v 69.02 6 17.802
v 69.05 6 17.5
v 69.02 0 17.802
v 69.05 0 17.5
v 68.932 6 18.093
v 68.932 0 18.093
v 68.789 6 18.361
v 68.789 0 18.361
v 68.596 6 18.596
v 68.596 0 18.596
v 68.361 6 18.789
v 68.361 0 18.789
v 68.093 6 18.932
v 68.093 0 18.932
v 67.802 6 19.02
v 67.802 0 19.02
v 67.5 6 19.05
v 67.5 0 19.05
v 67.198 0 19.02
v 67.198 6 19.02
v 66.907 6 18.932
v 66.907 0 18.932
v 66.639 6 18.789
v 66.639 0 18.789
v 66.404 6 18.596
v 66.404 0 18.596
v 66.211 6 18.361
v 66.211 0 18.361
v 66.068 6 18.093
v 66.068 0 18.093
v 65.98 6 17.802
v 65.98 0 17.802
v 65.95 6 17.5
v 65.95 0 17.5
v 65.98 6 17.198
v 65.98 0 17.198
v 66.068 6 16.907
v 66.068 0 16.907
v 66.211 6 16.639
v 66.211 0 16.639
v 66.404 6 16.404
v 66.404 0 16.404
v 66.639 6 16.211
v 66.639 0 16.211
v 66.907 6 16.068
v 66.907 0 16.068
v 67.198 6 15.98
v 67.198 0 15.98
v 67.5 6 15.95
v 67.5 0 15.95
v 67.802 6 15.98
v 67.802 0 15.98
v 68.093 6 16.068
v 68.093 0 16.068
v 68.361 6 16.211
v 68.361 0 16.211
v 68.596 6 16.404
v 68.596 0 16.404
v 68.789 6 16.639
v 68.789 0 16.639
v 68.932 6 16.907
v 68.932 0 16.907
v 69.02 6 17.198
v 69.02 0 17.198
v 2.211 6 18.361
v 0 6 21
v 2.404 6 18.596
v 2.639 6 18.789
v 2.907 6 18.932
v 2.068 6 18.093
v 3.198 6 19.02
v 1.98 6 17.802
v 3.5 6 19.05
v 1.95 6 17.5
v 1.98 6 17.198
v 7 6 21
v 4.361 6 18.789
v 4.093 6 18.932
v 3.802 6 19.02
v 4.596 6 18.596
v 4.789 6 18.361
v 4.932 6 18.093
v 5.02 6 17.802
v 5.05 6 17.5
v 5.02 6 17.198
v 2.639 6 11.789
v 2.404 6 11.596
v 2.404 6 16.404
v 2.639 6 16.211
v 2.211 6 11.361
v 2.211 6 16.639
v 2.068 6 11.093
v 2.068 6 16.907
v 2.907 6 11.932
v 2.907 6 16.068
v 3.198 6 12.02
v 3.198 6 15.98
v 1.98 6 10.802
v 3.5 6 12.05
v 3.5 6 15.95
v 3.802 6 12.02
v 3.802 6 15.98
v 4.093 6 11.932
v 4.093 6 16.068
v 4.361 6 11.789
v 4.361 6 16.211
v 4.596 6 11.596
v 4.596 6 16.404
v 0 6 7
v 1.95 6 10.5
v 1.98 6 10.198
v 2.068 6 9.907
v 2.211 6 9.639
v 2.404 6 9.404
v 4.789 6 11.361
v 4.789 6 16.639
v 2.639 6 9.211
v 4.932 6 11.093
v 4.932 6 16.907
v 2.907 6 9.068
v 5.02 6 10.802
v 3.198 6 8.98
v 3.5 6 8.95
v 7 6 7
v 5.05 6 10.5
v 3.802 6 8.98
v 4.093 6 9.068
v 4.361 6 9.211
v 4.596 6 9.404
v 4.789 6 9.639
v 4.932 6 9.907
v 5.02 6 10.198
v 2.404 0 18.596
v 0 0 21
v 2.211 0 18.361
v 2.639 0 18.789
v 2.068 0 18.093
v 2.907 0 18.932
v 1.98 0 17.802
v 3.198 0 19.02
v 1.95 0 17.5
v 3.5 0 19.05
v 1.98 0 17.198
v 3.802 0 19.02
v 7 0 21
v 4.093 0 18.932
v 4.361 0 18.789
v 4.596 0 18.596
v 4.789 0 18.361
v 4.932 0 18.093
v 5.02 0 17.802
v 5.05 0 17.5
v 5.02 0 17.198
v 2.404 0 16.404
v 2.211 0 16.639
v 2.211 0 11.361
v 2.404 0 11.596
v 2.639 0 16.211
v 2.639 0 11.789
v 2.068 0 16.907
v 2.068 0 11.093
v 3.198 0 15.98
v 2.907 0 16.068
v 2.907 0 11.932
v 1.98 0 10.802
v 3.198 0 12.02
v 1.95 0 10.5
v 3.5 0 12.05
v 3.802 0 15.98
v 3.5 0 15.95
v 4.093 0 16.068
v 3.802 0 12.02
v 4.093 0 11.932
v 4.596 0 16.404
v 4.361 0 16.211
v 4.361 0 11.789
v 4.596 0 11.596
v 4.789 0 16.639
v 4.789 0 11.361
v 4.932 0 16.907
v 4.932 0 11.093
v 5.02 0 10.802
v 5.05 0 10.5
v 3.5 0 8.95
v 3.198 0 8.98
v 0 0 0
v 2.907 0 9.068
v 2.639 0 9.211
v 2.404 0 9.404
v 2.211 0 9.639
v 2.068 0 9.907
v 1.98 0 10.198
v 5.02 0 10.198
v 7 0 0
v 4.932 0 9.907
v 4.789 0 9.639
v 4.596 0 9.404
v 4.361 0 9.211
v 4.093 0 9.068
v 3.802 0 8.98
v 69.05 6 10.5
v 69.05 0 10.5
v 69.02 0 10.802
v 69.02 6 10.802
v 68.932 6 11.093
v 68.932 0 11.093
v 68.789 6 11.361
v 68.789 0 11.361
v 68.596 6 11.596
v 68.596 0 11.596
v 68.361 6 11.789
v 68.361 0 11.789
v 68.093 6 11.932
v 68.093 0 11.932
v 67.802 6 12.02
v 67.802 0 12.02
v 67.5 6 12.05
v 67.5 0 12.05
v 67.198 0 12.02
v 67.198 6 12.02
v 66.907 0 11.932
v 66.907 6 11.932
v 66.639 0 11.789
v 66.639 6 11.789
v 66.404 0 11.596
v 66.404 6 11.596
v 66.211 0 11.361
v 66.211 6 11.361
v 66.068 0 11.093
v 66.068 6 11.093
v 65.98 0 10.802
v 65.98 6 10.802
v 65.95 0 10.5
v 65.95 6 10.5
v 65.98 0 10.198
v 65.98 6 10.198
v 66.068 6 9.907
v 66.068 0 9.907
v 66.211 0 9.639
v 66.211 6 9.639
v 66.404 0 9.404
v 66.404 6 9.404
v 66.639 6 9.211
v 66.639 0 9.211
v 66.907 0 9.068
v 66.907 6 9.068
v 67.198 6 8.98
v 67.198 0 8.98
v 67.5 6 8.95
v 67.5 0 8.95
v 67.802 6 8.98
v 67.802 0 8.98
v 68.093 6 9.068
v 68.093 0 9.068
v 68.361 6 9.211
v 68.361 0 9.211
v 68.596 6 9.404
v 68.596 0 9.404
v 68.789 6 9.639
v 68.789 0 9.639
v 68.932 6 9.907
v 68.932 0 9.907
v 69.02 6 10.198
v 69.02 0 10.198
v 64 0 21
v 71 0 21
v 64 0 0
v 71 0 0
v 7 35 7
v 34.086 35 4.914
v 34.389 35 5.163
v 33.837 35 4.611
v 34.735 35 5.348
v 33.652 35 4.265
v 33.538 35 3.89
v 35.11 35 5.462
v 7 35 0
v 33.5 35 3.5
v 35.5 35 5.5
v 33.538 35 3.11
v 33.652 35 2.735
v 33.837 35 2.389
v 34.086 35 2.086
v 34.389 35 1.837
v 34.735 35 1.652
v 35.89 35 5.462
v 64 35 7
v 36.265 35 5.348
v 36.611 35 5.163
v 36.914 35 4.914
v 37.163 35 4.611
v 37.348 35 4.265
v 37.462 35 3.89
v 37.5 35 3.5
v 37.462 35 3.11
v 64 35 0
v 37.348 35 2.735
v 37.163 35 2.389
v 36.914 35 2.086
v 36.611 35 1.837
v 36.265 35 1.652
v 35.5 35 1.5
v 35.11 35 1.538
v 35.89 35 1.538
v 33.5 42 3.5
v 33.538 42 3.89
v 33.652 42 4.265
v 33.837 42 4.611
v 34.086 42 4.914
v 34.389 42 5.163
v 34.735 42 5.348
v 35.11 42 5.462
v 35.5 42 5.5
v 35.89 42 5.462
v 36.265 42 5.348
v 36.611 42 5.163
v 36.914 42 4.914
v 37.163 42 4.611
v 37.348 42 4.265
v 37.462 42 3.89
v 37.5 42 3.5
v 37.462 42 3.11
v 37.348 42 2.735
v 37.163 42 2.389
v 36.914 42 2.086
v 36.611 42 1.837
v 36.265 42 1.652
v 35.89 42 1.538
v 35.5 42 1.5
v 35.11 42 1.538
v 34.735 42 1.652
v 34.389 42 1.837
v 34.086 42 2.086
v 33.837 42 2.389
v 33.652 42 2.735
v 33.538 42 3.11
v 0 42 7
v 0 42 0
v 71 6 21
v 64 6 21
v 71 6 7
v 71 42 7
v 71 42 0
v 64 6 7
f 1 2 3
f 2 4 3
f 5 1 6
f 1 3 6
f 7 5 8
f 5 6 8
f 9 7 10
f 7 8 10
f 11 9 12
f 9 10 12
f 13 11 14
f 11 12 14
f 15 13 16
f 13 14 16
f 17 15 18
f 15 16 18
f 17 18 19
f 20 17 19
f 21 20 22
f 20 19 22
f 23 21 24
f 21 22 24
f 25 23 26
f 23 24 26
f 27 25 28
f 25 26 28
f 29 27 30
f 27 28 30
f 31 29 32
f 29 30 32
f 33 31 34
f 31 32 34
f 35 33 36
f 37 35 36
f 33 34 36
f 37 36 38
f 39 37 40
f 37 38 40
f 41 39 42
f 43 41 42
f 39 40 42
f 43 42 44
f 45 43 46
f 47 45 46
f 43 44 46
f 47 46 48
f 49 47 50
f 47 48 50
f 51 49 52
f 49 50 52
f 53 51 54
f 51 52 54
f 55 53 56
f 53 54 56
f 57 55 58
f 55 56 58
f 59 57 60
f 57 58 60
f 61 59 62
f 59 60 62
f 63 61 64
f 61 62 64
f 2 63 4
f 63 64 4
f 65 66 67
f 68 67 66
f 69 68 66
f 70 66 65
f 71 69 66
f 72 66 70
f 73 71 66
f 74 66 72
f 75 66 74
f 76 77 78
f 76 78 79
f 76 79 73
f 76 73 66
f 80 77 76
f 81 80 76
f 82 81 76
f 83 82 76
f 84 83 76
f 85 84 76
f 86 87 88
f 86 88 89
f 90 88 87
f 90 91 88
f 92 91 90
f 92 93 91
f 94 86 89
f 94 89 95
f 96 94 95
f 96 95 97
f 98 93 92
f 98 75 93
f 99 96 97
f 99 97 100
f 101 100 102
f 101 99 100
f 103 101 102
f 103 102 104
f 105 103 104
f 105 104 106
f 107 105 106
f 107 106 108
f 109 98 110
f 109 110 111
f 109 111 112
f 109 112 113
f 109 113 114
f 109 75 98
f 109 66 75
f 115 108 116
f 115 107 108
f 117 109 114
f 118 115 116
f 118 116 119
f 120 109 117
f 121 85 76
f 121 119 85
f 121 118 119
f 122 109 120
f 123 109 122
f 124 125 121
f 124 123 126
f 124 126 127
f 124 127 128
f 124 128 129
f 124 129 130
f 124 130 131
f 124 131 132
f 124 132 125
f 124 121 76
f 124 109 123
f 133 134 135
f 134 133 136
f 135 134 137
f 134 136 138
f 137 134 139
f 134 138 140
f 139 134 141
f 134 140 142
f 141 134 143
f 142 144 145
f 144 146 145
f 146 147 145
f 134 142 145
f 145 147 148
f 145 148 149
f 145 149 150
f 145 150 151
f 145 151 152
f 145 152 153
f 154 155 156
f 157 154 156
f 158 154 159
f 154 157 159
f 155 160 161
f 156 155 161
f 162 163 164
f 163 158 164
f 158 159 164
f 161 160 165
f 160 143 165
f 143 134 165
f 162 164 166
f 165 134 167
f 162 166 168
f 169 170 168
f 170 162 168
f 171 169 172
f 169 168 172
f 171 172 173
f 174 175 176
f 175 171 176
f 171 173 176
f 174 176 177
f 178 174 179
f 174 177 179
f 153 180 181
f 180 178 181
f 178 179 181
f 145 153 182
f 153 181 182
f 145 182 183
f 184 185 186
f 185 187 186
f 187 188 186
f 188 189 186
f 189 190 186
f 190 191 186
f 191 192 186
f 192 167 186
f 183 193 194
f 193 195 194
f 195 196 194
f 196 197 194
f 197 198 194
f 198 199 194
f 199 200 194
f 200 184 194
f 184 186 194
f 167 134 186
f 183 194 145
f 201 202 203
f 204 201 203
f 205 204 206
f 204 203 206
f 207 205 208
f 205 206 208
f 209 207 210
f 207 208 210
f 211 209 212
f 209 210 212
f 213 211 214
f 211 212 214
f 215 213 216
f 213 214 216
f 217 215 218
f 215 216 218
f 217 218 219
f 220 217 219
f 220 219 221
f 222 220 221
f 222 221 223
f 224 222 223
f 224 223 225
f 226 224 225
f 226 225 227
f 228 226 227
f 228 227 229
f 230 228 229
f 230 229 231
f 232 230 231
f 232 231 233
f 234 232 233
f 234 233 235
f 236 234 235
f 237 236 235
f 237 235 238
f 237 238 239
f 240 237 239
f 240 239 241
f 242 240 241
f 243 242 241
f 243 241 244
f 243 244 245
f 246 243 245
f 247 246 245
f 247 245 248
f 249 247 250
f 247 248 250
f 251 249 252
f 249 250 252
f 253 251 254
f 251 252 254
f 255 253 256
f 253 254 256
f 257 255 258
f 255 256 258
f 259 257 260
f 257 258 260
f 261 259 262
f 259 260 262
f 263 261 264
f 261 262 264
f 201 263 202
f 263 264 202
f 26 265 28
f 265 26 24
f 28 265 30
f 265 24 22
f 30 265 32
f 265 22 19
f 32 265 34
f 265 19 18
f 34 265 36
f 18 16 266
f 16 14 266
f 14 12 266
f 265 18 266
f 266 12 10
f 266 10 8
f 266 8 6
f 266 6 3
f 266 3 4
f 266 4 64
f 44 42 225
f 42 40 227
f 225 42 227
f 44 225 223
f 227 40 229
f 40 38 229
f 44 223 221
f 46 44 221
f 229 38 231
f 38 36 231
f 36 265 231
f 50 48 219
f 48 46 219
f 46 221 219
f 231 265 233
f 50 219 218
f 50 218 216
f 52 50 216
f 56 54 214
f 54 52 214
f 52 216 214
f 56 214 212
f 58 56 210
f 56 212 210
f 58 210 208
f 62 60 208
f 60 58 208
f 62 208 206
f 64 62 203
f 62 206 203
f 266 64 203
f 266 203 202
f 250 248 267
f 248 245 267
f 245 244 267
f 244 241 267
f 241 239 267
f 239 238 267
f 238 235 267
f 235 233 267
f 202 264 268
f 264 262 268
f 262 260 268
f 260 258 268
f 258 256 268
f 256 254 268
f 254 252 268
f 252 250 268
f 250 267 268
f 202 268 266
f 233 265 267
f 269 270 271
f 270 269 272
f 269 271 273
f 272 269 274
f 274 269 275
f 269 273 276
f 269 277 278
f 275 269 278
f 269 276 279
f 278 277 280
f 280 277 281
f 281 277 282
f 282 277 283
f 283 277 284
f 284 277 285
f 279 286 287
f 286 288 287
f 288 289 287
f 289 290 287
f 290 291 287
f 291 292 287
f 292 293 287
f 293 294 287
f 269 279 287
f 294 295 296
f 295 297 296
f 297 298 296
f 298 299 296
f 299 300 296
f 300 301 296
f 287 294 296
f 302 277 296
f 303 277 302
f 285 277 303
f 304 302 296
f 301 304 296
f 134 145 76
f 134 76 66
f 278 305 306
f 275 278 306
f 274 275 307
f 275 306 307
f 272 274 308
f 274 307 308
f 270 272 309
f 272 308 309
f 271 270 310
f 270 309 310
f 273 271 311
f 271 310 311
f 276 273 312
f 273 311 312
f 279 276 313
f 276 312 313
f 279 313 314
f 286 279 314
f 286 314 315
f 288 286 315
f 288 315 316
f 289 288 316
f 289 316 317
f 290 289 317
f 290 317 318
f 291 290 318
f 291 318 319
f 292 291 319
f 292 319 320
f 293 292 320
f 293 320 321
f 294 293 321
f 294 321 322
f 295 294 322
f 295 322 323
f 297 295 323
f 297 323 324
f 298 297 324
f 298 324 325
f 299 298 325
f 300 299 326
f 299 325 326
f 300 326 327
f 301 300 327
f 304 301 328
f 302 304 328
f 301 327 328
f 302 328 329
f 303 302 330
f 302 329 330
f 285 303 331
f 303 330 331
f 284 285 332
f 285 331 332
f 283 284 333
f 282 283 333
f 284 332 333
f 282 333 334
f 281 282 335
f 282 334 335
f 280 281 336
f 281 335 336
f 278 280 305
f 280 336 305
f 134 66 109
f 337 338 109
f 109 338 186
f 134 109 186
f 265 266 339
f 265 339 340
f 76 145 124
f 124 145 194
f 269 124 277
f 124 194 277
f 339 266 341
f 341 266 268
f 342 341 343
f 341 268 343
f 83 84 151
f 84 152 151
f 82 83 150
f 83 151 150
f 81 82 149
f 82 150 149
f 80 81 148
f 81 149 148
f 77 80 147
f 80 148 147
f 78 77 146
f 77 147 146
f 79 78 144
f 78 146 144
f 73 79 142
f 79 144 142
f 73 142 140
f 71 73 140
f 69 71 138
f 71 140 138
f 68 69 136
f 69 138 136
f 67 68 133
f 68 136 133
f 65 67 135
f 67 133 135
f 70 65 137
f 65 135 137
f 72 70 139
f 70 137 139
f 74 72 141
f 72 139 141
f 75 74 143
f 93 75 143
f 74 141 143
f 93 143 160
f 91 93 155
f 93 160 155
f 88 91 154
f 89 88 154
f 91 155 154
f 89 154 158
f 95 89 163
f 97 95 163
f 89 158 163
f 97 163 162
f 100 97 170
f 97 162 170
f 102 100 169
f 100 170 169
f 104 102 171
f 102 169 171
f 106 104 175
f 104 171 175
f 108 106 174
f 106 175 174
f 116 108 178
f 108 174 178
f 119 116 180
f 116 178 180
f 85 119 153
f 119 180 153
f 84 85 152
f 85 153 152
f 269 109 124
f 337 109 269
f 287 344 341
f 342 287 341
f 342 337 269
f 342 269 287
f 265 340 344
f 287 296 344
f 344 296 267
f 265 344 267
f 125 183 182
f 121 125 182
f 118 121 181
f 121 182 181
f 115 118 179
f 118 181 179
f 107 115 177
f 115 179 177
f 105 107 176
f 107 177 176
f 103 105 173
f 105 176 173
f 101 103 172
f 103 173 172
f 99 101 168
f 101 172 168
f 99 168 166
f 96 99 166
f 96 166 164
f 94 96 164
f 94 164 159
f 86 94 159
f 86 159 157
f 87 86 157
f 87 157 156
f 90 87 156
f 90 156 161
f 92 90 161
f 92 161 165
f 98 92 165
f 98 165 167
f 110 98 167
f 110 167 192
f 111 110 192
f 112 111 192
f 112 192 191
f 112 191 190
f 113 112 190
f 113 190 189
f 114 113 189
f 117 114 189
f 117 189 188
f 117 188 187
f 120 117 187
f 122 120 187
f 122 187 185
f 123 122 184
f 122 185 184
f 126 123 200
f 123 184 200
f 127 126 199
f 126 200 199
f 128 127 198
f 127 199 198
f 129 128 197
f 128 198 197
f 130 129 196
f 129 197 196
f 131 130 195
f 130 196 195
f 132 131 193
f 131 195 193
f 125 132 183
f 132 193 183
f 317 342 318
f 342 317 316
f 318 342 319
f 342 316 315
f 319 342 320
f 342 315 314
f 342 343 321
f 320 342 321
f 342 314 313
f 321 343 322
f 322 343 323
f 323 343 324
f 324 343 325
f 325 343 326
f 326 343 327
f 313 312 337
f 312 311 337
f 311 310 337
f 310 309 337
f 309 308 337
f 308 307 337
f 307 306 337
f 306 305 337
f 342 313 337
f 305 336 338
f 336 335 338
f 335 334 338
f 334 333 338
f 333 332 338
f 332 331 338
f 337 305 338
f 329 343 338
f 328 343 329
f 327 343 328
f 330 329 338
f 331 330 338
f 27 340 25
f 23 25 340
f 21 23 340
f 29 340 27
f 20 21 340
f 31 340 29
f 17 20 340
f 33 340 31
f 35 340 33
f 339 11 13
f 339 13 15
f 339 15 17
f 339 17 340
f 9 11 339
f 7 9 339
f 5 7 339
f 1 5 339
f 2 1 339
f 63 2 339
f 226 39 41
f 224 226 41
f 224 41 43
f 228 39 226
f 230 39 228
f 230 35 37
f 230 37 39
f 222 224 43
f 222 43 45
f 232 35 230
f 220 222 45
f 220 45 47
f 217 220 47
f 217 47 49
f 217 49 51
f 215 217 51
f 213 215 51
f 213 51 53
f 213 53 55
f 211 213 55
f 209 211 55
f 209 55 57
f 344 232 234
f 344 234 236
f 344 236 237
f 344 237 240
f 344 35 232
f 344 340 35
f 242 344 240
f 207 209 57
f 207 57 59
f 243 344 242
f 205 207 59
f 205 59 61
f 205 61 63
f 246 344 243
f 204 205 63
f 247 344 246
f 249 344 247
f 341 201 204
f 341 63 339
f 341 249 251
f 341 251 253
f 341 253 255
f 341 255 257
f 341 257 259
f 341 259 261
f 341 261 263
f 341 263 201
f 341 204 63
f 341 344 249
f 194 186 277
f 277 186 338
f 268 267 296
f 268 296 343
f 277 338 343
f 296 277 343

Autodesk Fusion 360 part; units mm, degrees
sketch "Sketch1" plane through (0, 0, 0) normal (0, 0, 1) x (1, 0, 0)
  line L0 (0, 0) -> (7, 0)
  line L1 (7, 0) -> (7, 35)
  line L2 (7, 35) -> (64, 35)
  line L3 (64, 35) -> (64, 0)
  line L4 (64, 0) -> (71, 0)
  line L5 (71, 0) -> (71, 42)
  line L6 (71, 42) -> (0, 42)
  line L7 (0, 42) -> (0, 0)
  dimension "d1" = 7
  dimension "d2" = 35
  dimension "d3" = 57
  dimension "d9" = 7
extrude "Extrude1" add sketch "Sketch1" along normal blind 7
sketch "Sketch2" plane through (0, 0, 7) normal (0, 0, 1) x (-1, 0, 0)
  line L0 (0, -42) -> (0, 0)
  line L1 (0, 0) -> (-7, 0)
  line L2 (-7, 0) -> (-7, -35)
  line L3 (-7, -35) -> (-64, -35)
  line L4 (-64, -35) -> (-64, 0)
  line L5 (-64, 0) -> (-71, 0)
  line L6 (-71, 0) -> (-71, -42)
  line L7 (-71, -42) -> (0, -42)
  line L8 (0, -4) -> (-7, -4)
  line L9 (-64, -4) -> (-71, -4)
  dimension "d10" = 4
extrude "Extrude2" add sketch "Sketch2" along normal blind 7 contours L0 L1 L2 L8 | L4 L5 L6 L9
extrude "Extrude4" add 1 faces at (4.6667, 2.6667, 14) along direction (0, 0, 1) blind 7
extrude "Extrude5" add 1 faces at (66.3333, 2.6667, 14) along direction (0, 0, 1) blind 7
sketch "Sketch5" plane through (0, 42, 0) normal (0, 1, 0) x (-1, 0, 0)
  line L0 (-71, 0) -> (0, 0)
  line L1 (0, 0) -> (0, 7)
  line L2 (0, 7) -> (-71, 7)
  line L3 (-71, 7) -> (-71, 0)
  line L4 (-71, 7) -> (0, 0)
  line L5 (0, 7) -> (-71, 0)
  circle A0 centre (-35.5, 3.5) radius 2
  dimension "d25" = 4
extrude "Extrude7" cut sketch "Sketch5" against normal blind 100 contours L4 L5 A0 | L4 L5 A0 | L4 L5 A0 | L4 L5 A0
sketch "Sketch6" plane through (0, 0, 0) normal (0, -1, 0) x (1, 0, 0)
  line L0 (0, 0) -> (7, 0)
  line L1 (7, 0) -> (7, 21)
  line L2 (7, 21) -> (0, 21)
  line L3 (0, 21) -> (0, 0)
  line L4 (3.5, 21) -> (3.5, 17.5)
  circle A0 centre (3.5, 17.5) radius 1.55
  line L5 (3.5, 17.5) -> (3.5, 10.5)
  circle A1 centre (3.5, 10.5) radius 1.55
  dimension "d28" = 3.5
  dimension "d29" = 3.1
  dimension "d30" = 7
sketch "Sketch7" plane through (0, 0, 0) normal (0, -1, 0) x (1, 0, 0)
  line L0 (64, 0) -> (71, 0)
  line L1 (71, 0) -> (71, 21)
  line L2 (71, 21) -> (64, 21)
  line L3 (64, 21) -> (64, 0)
  line L4 (67.5, 21) -> (67.5, 17.5)
  line L5 (67.5, 17.5) -> (67.5, 10.5)
  circle A0 centre (67.5, 17.5) radius 1.55
  circle A1 centre (67.5, 10.5) radius 1.55
  dimension "d31" = 3.5
  dimension "d32" = 7
  dimension "d33" = 3.1
extrude "Extrude8" cut sketch "Sketch6" sketch "Sketch7" against normal blind 100 contours L4 A0 L5 | L4 A0 L5 | A1 of sketch 2 contours L4 L5 A0 | L4 L5 A0 | A1
extrude "Extrude9" add 2 faces at (6.327, 4, 15.0144) (64.673, 4, 15.0144) along direction (0, 1, 0) blind 2
